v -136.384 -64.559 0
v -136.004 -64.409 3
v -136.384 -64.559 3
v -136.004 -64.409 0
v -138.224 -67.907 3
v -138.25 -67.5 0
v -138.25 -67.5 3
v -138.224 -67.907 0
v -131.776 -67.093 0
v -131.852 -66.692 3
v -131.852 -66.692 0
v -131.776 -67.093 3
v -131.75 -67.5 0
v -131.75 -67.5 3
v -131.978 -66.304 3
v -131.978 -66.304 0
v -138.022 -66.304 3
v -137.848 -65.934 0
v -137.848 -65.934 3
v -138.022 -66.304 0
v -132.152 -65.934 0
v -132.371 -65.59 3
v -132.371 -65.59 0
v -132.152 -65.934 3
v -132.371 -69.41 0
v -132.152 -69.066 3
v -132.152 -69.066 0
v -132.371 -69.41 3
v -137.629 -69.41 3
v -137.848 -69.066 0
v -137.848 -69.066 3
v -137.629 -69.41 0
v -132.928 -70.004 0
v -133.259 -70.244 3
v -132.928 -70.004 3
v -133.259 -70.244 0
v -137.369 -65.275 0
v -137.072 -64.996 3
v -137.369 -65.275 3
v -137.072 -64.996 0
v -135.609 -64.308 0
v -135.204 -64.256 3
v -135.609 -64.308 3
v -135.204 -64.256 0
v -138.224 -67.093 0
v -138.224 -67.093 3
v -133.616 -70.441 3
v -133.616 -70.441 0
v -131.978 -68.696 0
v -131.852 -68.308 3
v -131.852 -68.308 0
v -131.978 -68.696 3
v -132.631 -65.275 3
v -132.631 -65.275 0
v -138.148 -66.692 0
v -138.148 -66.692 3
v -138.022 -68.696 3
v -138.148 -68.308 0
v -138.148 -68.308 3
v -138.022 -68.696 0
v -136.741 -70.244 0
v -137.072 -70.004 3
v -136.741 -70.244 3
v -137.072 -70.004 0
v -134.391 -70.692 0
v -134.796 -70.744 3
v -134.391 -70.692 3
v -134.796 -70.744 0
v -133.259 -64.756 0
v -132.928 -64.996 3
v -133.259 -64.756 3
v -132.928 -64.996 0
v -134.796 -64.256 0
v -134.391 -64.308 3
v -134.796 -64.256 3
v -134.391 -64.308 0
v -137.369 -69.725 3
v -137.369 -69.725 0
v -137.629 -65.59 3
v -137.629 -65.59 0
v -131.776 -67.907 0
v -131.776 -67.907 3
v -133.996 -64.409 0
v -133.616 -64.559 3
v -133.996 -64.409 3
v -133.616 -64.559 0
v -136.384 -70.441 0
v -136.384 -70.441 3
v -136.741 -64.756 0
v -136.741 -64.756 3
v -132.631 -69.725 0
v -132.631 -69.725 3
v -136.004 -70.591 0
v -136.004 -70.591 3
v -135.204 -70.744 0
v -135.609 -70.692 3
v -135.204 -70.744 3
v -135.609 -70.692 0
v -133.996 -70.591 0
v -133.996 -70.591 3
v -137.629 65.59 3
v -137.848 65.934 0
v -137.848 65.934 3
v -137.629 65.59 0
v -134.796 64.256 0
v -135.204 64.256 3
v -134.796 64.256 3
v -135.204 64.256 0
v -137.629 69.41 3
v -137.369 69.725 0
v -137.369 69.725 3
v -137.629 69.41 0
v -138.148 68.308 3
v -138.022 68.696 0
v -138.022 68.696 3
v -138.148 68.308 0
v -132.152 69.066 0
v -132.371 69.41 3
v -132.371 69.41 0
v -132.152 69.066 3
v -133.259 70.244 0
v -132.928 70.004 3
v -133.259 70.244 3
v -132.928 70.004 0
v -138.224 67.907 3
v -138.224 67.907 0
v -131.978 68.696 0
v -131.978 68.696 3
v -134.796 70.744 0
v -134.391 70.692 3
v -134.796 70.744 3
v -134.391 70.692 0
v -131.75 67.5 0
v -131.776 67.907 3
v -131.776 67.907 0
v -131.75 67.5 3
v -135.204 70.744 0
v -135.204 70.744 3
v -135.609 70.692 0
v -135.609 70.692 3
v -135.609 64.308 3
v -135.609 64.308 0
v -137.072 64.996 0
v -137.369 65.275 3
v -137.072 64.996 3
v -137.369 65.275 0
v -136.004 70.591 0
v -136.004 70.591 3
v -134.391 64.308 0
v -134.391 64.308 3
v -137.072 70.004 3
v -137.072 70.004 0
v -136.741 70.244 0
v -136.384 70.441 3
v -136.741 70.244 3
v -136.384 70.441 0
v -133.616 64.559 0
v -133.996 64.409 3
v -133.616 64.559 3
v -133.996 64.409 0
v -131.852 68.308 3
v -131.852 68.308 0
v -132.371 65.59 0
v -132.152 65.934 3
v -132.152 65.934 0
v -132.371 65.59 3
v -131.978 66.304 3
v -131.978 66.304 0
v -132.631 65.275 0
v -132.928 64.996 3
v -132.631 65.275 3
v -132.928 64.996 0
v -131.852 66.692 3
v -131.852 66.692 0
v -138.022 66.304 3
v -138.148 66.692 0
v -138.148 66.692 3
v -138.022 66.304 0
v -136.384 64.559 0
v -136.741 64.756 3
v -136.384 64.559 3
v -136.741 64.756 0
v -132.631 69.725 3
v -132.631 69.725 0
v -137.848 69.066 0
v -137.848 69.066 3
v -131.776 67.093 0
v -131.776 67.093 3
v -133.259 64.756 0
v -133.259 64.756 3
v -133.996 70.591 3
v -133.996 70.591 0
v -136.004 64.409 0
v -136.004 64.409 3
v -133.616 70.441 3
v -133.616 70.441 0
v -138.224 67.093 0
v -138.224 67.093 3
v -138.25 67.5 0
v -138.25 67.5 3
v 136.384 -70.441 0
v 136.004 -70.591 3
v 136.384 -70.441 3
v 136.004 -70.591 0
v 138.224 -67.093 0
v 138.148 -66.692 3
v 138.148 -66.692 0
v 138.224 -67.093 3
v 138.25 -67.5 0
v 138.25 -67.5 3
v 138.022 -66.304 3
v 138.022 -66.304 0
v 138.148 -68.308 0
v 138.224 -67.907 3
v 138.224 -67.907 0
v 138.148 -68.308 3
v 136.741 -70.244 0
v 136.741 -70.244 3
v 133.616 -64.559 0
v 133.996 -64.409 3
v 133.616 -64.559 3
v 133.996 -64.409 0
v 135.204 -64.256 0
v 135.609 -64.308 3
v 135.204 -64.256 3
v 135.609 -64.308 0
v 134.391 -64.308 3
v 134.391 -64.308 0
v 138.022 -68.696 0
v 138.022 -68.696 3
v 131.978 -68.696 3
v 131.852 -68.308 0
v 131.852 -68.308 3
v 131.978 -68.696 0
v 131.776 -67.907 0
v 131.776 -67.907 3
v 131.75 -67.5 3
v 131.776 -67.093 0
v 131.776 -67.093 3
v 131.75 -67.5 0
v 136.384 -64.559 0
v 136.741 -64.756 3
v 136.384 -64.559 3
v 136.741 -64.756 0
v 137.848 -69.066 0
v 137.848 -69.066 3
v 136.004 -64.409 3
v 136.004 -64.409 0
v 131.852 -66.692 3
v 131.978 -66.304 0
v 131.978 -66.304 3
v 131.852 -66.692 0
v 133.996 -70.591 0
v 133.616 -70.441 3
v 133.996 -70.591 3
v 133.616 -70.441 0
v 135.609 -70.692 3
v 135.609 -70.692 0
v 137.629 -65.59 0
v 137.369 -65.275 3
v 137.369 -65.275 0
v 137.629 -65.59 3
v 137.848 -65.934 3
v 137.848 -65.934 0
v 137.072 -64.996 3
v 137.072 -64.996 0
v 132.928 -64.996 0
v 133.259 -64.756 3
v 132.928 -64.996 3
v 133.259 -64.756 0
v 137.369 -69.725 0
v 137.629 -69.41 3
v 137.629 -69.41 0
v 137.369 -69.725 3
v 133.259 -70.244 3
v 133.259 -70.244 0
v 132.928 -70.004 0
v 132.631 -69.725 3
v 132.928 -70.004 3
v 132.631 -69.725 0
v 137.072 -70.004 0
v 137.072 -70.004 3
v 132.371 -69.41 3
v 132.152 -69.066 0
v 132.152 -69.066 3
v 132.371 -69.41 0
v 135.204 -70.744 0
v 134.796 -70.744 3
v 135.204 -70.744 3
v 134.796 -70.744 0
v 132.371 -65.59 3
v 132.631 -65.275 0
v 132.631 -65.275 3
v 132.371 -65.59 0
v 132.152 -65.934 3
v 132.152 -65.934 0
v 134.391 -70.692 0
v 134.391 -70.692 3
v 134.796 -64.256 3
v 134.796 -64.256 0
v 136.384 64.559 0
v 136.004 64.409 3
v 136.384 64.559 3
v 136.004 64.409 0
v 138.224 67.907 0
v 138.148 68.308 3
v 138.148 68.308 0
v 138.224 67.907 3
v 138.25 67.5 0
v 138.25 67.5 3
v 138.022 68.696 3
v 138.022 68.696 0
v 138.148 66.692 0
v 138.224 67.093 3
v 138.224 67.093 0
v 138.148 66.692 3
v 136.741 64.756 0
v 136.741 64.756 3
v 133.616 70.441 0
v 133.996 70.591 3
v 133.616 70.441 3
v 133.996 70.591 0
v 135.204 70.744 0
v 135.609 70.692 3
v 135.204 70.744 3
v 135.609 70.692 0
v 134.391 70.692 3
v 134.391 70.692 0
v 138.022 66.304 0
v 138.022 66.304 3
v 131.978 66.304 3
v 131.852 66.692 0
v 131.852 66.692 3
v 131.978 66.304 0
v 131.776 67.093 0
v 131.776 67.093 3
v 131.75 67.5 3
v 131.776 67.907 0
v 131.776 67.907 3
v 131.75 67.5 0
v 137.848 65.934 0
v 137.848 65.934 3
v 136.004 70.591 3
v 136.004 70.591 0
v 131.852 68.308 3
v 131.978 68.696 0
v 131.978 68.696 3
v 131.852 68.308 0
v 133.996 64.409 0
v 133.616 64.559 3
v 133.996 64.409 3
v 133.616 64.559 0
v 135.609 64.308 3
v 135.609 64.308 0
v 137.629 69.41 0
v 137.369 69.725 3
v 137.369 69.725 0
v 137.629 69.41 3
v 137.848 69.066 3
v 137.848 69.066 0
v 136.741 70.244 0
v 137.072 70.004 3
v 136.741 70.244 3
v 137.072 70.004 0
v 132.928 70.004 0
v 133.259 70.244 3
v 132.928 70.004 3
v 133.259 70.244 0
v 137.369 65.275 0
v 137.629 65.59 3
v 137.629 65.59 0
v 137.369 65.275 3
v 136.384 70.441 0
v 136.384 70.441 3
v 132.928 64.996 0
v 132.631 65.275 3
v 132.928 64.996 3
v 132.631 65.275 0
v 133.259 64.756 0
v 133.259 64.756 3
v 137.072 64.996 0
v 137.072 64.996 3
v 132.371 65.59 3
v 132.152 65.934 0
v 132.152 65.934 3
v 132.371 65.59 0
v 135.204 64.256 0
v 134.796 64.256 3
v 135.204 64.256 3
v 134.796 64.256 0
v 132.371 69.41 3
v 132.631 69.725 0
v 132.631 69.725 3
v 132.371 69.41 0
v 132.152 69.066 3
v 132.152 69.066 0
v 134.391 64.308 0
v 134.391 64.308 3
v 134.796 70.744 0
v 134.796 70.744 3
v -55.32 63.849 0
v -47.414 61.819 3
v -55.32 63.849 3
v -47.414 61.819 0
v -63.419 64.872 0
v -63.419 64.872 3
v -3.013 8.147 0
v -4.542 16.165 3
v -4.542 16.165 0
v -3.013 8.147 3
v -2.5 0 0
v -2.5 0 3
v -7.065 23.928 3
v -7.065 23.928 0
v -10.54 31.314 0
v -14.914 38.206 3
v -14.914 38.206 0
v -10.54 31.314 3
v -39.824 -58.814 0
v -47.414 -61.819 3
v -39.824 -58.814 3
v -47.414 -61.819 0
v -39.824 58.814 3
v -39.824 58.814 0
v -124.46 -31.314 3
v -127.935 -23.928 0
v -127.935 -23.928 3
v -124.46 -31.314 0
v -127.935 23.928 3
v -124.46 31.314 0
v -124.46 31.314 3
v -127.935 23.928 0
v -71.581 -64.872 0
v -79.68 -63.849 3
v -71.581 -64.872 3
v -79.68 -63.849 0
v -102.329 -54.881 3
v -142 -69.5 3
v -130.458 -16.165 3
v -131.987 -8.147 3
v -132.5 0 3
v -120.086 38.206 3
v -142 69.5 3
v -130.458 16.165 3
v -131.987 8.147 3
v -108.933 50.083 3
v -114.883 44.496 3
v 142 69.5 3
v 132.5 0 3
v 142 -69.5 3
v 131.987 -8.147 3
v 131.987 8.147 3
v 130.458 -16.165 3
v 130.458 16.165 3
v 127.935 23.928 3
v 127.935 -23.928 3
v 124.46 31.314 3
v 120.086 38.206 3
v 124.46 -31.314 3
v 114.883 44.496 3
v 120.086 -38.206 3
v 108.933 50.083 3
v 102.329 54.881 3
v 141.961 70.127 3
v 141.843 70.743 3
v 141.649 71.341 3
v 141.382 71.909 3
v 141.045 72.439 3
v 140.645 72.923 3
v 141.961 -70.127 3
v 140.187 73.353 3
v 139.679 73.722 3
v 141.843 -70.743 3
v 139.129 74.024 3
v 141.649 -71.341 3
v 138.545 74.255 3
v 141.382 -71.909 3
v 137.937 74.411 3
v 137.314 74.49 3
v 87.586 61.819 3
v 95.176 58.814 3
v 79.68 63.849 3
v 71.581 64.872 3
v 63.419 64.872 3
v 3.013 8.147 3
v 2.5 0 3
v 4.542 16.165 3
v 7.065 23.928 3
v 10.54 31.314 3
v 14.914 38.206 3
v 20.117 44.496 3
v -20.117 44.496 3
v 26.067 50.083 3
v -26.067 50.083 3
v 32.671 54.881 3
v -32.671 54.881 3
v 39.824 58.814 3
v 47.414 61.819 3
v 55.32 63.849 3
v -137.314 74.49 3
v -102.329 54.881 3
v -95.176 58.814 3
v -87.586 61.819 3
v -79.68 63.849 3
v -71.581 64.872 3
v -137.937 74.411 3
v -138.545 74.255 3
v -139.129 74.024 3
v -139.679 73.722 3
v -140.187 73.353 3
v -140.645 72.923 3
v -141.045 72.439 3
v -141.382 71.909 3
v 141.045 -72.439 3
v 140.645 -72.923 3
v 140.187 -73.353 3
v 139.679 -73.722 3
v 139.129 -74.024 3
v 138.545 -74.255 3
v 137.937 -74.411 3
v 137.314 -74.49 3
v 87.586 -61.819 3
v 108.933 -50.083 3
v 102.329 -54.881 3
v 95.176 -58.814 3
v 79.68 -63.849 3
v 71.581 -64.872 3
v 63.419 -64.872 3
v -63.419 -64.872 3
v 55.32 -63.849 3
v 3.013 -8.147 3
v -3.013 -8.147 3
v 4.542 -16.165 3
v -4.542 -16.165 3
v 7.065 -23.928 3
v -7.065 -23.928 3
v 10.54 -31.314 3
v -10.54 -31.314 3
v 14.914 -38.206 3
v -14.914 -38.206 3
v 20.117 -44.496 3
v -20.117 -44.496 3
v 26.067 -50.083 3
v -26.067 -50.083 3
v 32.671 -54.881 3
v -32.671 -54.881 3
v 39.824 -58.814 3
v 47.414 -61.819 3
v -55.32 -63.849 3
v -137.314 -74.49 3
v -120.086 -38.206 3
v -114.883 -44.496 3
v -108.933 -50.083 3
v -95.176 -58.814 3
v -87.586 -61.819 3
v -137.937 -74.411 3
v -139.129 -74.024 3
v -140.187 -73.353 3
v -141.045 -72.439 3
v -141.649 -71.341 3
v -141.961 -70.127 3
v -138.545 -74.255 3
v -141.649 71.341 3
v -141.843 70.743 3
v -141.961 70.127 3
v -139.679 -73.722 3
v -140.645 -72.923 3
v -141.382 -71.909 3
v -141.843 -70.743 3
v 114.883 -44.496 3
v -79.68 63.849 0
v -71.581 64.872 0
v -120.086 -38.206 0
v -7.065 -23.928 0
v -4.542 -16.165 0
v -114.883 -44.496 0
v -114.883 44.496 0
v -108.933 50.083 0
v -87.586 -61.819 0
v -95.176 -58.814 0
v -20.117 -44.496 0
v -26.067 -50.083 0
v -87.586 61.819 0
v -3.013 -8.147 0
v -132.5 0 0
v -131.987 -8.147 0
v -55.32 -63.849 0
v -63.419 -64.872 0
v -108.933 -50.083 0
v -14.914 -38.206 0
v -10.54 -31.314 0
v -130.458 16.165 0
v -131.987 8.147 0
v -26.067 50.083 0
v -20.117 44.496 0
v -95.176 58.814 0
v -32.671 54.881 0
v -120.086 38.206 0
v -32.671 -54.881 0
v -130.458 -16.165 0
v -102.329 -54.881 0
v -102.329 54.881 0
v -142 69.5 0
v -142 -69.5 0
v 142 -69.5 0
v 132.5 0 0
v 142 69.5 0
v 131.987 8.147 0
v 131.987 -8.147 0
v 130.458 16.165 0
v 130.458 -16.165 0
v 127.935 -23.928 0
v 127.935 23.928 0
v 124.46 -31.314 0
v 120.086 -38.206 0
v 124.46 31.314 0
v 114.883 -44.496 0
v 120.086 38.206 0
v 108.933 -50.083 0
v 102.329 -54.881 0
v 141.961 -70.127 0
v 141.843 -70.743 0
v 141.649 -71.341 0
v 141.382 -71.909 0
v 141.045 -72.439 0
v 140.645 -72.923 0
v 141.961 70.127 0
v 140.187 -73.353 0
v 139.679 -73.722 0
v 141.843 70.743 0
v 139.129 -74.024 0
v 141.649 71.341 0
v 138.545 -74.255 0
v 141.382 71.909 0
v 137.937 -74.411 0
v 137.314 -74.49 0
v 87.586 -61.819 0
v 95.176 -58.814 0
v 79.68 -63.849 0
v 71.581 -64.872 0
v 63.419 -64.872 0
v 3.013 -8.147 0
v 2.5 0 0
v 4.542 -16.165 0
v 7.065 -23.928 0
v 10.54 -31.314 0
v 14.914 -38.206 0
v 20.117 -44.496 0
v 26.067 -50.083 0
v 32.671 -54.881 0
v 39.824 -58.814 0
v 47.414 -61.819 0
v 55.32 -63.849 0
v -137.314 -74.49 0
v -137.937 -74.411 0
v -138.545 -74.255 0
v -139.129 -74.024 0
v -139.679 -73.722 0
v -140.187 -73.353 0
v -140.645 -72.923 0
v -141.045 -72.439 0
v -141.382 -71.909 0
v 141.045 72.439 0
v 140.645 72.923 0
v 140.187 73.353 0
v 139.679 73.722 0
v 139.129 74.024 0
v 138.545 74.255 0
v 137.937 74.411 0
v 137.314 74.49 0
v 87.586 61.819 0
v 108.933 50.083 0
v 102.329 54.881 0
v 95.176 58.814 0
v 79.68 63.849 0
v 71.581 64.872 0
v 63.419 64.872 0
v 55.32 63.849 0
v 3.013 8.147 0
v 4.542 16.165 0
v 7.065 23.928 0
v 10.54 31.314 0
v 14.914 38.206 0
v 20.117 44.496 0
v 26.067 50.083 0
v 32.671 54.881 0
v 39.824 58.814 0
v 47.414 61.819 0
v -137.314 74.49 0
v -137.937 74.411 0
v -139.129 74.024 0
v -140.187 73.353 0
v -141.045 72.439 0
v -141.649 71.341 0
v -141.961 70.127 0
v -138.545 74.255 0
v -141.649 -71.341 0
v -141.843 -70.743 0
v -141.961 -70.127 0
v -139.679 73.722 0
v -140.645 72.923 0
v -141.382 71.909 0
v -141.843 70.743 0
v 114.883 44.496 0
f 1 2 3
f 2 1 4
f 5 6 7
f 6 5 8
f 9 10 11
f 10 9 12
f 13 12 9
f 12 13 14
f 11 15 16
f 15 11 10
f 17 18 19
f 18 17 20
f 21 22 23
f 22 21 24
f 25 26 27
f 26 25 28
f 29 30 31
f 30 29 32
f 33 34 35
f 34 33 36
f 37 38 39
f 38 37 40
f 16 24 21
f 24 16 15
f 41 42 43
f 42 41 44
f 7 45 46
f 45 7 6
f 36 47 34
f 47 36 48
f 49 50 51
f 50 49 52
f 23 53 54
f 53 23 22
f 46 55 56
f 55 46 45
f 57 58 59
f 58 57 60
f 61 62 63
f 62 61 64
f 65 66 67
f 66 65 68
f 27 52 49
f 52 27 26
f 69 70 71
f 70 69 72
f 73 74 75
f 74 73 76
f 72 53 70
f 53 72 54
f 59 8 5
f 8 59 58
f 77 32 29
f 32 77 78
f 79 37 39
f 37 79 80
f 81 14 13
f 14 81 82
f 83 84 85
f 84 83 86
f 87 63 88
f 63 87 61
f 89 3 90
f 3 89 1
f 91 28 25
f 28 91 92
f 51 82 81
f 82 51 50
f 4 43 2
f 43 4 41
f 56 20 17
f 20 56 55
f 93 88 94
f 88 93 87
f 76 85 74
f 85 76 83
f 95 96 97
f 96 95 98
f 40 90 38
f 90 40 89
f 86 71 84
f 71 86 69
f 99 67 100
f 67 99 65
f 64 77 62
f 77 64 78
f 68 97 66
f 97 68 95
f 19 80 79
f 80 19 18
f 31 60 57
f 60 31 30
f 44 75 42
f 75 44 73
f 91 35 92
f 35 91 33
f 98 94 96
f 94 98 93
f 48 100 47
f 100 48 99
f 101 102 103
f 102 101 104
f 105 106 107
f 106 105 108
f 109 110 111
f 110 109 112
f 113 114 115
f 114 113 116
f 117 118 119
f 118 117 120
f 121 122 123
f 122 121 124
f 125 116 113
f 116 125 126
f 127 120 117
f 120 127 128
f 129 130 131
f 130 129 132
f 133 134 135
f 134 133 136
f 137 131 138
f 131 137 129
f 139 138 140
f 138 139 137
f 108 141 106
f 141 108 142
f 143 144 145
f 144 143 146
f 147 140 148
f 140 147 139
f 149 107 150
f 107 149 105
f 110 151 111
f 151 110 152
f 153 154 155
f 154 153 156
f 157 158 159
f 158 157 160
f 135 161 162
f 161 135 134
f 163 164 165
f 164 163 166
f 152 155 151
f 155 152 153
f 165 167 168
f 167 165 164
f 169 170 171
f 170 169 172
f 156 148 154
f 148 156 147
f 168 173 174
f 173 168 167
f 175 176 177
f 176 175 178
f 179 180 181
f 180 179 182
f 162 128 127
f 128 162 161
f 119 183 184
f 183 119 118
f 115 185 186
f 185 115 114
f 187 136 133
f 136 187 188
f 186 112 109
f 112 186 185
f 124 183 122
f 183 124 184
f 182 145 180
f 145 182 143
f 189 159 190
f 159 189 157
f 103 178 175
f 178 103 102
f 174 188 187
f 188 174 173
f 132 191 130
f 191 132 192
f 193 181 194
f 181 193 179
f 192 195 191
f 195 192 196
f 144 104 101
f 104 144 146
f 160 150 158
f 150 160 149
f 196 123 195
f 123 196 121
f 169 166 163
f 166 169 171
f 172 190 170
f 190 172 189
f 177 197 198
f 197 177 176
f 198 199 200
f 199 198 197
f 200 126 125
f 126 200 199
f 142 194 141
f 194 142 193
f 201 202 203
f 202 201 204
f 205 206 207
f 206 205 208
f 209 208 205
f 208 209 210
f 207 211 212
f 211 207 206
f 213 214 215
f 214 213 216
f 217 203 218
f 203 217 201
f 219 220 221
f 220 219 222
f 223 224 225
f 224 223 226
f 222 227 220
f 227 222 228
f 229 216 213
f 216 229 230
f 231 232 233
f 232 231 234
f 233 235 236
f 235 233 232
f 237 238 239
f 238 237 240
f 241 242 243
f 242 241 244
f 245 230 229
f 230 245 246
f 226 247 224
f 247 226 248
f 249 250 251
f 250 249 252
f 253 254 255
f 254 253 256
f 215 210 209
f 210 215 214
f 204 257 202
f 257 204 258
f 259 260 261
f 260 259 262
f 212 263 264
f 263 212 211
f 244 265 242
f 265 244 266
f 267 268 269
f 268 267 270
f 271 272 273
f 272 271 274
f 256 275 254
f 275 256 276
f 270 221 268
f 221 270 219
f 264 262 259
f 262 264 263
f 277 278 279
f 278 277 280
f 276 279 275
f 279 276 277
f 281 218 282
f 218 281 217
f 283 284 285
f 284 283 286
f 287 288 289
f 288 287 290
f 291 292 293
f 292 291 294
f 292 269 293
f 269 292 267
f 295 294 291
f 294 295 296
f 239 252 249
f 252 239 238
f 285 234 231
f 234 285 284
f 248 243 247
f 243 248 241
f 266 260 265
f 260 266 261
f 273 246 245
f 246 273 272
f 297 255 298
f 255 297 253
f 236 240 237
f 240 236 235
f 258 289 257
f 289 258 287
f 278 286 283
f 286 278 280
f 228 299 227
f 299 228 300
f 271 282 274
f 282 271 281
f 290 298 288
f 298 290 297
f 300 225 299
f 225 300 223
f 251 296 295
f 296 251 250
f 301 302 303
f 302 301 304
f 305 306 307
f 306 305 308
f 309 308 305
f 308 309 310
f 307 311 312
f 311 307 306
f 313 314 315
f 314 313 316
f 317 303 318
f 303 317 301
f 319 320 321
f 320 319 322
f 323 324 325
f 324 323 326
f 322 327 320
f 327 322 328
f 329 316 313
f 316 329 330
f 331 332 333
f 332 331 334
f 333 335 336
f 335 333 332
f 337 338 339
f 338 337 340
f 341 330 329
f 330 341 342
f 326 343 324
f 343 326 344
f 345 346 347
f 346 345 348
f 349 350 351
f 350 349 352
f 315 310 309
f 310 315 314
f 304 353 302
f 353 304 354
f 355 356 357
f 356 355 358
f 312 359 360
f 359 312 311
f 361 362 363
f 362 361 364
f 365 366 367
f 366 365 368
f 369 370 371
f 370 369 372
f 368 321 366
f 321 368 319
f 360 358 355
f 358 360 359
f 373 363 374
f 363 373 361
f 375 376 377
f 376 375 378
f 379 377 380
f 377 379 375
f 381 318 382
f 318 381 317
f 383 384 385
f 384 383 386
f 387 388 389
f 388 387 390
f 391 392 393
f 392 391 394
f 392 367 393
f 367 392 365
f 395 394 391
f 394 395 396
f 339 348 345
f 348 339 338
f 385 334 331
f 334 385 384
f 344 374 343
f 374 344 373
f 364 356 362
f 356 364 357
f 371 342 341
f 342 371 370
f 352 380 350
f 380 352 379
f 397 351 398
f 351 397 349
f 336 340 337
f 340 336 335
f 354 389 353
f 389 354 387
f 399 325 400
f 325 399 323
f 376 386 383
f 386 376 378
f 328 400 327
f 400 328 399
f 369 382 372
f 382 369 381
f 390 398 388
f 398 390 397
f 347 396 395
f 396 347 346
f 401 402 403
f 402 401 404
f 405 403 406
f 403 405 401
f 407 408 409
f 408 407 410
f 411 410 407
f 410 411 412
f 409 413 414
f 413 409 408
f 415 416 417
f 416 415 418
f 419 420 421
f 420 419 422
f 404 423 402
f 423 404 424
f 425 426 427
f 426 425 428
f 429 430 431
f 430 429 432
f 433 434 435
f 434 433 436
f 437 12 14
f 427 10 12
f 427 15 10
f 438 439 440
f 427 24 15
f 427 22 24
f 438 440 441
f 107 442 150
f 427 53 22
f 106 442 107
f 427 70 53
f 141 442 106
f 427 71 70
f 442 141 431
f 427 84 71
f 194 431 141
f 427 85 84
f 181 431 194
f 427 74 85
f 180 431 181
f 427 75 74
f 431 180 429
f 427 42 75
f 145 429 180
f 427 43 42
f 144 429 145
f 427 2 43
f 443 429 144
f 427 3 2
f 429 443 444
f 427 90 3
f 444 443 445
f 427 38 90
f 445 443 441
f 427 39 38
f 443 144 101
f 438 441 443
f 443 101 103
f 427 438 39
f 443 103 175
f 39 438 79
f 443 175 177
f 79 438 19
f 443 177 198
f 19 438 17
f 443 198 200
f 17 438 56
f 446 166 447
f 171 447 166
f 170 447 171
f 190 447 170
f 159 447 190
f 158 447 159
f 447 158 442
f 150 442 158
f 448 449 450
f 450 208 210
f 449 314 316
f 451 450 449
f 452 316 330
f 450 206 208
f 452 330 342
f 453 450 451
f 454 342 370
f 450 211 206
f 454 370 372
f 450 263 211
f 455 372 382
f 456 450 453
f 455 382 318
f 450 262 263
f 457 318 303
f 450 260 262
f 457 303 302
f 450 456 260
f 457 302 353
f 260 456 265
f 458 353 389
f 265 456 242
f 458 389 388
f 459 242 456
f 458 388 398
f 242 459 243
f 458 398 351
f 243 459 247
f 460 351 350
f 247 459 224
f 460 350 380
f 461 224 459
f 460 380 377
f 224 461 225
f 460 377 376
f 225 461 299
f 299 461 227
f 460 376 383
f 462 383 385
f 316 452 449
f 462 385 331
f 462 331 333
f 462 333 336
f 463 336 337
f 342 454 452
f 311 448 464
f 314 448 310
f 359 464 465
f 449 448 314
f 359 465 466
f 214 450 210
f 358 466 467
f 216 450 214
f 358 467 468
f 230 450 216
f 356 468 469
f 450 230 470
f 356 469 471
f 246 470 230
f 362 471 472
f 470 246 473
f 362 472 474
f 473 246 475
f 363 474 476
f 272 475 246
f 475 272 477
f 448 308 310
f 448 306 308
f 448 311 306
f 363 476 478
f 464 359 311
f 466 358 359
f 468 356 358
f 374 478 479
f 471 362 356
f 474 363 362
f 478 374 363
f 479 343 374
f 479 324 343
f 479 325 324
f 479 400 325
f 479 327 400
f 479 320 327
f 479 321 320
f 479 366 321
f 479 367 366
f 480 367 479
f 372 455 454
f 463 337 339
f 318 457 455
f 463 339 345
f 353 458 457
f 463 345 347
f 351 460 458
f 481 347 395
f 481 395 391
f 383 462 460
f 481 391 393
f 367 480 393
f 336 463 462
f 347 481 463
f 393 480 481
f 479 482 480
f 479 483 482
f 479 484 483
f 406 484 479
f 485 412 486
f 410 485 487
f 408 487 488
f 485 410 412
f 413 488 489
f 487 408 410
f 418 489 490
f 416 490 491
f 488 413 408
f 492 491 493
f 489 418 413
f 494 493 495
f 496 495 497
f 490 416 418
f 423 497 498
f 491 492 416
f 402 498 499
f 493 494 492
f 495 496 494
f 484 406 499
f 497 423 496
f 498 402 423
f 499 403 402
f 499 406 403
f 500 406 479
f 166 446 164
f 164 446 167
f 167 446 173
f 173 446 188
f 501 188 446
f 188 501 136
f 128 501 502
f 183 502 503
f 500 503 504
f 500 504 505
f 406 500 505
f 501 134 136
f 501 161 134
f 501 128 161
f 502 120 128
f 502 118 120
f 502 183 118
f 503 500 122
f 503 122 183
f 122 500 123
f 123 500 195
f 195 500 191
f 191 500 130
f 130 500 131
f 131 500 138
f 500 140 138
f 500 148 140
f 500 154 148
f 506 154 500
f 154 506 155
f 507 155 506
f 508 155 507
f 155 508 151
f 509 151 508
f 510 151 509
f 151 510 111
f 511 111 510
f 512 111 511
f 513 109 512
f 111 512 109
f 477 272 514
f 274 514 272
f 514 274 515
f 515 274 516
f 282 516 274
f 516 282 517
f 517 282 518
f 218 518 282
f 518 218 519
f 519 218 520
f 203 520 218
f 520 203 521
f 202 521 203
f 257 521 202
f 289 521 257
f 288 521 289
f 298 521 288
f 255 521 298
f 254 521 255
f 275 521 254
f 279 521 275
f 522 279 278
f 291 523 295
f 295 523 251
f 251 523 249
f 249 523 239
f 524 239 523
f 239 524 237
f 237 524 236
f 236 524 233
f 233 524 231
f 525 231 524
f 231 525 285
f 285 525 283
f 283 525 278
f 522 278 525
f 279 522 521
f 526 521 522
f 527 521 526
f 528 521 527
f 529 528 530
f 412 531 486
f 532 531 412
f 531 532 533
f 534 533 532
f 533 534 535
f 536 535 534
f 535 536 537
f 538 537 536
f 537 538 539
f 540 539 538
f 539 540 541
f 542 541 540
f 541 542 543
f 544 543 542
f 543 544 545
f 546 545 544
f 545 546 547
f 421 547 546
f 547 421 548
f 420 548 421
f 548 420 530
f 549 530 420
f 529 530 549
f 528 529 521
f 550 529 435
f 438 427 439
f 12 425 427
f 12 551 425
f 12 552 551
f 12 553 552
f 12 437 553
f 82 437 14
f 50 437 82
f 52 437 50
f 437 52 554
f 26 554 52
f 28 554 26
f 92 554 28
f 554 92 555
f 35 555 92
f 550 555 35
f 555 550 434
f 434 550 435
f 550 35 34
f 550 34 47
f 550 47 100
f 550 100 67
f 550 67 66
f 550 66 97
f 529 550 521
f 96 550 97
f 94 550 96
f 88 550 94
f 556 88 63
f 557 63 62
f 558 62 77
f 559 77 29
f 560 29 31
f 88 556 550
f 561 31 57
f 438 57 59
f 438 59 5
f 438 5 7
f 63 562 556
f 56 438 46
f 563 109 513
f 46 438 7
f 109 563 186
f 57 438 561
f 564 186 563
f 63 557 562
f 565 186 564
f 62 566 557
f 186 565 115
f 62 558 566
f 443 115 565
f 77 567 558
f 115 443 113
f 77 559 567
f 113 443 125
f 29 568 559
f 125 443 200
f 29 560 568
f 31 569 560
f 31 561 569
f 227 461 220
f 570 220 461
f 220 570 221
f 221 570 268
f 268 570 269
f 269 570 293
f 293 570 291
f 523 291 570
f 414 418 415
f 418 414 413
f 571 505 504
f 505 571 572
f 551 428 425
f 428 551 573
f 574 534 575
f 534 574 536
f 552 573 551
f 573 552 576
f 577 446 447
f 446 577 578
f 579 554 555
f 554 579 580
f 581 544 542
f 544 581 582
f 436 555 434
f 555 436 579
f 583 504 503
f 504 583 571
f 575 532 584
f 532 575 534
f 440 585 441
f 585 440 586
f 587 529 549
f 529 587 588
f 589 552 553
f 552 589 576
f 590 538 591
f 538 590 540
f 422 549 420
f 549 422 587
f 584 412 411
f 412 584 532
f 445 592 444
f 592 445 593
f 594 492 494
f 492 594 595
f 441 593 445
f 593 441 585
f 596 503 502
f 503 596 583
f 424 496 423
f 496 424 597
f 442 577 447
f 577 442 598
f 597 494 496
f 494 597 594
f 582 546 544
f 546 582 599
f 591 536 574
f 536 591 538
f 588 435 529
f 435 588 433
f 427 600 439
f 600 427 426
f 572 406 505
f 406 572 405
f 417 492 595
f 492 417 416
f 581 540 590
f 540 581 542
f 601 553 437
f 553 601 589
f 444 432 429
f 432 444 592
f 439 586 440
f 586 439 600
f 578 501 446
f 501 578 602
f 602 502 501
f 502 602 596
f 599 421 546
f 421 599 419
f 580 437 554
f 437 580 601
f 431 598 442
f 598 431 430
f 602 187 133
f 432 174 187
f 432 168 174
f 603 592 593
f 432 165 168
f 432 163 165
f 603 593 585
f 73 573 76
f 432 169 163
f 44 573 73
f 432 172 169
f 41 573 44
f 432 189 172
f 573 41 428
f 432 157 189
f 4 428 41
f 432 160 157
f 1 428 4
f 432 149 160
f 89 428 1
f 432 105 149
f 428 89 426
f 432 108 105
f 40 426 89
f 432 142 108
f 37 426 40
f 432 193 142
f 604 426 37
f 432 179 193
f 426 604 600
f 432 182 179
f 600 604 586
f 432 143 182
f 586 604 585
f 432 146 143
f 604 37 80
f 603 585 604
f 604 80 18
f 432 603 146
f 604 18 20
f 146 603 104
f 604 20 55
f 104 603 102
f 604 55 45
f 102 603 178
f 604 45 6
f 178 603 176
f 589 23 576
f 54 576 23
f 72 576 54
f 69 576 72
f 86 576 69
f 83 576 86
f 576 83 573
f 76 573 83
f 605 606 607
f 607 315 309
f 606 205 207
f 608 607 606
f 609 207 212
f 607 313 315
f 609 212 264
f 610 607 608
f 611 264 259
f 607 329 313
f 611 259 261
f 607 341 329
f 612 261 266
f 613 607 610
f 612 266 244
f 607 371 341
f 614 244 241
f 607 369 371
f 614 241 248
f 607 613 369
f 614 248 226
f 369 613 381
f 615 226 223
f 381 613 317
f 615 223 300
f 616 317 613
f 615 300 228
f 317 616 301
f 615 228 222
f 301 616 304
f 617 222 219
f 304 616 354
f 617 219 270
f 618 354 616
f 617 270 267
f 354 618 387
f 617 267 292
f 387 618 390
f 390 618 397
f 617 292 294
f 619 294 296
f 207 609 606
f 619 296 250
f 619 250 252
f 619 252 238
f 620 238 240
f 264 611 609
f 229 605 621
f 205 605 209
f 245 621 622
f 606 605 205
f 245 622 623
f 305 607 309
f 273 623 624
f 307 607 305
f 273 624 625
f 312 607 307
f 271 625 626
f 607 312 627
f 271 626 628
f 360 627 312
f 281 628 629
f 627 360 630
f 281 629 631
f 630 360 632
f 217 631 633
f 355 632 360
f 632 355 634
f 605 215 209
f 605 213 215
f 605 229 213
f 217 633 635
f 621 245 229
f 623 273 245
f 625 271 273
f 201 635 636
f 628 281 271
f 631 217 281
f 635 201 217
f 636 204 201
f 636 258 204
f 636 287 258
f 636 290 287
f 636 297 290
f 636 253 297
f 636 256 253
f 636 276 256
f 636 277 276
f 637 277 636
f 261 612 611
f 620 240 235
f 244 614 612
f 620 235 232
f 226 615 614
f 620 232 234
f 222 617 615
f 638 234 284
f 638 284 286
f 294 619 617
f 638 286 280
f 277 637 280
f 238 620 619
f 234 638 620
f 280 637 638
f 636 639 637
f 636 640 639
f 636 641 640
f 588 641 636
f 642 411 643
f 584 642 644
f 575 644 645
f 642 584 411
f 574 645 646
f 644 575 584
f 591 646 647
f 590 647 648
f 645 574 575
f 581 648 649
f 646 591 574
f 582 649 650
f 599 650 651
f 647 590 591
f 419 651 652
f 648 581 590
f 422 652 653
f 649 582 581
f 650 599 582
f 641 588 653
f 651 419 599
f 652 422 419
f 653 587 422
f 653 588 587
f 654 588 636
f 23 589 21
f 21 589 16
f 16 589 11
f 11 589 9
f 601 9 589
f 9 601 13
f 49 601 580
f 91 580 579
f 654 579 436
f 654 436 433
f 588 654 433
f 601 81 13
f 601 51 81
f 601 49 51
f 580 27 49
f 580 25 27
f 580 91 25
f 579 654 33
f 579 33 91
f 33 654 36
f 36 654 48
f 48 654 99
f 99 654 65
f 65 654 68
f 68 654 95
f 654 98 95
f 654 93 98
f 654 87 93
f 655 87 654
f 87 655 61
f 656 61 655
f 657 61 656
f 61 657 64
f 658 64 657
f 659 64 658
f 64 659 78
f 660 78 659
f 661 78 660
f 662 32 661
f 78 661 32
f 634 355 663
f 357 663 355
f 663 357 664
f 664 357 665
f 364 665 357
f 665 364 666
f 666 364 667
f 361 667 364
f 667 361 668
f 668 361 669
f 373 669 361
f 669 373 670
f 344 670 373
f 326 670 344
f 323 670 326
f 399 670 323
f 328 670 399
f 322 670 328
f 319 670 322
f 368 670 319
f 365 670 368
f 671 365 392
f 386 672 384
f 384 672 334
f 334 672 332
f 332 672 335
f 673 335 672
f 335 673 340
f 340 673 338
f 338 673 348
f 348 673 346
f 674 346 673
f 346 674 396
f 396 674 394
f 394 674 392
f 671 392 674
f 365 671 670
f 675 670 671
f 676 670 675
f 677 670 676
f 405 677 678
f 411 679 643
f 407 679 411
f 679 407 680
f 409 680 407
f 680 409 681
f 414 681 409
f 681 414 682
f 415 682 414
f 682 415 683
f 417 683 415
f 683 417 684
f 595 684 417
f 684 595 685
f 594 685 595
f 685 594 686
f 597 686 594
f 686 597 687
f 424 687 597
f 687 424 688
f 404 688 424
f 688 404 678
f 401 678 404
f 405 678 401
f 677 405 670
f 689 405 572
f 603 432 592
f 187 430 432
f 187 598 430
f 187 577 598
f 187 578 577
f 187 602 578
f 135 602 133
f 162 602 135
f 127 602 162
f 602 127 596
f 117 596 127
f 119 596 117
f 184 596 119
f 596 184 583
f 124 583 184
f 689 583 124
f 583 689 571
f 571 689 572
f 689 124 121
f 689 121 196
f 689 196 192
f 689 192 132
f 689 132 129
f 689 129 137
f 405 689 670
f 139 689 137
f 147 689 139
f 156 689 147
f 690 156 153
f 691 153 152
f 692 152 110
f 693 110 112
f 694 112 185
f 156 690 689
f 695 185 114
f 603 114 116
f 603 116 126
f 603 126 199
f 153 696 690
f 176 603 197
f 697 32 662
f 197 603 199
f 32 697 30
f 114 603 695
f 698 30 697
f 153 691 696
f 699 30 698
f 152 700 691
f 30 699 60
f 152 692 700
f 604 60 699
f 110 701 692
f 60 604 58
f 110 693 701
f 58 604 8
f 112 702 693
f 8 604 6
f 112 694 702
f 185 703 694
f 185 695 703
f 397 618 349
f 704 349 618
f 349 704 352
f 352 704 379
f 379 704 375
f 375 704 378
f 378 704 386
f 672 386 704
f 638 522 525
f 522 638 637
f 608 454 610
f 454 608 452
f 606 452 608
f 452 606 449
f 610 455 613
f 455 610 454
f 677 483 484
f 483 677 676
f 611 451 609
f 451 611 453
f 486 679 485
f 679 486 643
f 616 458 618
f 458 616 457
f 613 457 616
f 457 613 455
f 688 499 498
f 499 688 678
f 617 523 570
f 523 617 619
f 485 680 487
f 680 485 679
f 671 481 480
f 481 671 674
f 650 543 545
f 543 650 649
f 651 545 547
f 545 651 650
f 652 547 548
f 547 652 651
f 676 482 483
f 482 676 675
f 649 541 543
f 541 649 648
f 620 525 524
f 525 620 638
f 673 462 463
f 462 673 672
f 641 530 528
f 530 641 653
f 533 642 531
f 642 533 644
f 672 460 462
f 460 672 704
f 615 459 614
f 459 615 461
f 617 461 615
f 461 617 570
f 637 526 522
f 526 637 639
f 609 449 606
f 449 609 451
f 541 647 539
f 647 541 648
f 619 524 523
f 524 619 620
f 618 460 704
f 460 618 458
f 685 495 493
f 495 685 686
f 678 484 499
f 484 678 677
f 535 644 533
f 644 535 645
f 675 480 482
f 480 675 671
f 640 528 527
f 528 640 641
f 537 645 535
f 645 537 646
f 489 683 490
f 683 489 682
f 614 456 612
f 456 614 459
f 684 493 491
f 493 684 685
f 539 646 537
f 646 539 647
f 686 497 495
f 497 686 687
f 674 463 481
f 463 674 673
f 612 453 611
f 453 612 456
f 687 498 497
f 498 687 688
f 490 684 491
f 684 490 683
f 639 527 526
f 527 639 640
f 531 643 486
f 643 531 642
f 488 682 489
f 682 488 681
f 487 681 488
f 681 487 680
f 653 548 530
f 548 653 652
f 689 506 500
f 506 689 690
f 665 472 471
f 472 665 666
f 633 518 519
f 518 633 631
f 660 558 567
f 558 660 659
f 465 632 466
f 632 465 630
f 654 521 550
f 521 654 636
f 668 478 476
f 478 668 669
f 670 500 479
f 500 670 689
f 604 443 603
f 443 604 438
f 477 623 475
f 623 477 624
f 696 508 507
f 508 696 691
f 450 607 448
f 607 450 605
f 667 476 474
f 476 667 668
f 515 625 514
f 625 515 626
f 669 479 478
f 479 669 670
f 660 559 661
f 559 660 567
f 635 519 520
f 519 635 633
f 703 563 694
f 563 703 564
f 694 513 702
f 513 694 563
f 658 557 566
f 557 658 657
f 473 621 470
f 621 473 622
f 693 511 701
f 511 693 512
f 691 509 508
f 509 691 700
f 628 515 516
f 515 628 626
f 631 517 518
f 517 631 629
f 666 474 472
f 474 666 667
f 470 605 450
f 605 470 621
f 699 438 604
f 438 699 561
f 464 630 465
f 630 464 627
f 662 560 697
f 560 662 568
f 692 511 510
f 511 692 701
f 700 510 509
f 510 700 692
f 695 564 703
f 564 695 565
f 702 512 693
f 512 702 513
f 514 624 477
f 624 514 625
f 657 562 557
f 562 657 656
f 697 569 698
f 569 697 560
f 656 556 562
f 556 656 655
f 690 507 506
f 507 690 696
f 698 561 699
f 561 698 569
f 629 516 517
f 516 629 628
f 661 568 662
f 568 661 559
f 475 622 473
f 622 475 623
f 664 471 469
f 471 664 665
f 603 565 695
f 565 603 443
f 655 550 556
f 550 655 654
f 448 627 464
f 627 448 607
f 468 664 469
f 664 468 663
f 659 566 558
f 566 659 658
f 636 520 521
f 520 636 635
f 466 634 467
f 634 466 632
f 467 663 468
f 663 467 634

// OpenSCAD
$fn = 50;


difference() {
	union() {
		hull() {
			translate(v = [-137.0000000000, 69.5000000000, 0]) {
				cylinder(h = 3, r = 5);
			}
			translate(v = [137.0000000000, 69.5000000000, 0]) {
				cylinder(h = 3, r = 5);
			}
			translate(v = [-137.0000000000, -69.5000000000, 0]) {
				cylinder(h = 3, r = 5);
			}
			translate(v = [137.0000000000, -69.5000000000, 0]) {
				cylinder(h = 3, r = 5);
			}
		}
	}
	union() {
		#translate(v = [-135.0000000000, -67.5000000000, -100.0000000000]) {
			cylinder(h = 200, r = 3.2500000000);
		}
		#translate(v = [-135.0000000000, 67.5000000000, -100.0000000000]) {
			cylinder(h = 200, r = 3.2500000000);
		}
		#translate(v = [135.0000000000, -67.5000000000, -100.0000000000]) {
			cylinder(h = 200, r = 3.2500000000);
		}
		#translate(v = [135.0000000000, 67.5000000000, -100.0000000000]) {
			cylinder(h = 200, r = 3.2500000000);
		}
		#translate(v = [-67.5000000000, 0, 0]) {
			cylinder(h = 3, r = 65.0000000000);
		}
		#translate(v = [67.5000000000, 0, 0]) {
			cylinder(h = 3, r = 65.0000000000);
		}
	}
}
